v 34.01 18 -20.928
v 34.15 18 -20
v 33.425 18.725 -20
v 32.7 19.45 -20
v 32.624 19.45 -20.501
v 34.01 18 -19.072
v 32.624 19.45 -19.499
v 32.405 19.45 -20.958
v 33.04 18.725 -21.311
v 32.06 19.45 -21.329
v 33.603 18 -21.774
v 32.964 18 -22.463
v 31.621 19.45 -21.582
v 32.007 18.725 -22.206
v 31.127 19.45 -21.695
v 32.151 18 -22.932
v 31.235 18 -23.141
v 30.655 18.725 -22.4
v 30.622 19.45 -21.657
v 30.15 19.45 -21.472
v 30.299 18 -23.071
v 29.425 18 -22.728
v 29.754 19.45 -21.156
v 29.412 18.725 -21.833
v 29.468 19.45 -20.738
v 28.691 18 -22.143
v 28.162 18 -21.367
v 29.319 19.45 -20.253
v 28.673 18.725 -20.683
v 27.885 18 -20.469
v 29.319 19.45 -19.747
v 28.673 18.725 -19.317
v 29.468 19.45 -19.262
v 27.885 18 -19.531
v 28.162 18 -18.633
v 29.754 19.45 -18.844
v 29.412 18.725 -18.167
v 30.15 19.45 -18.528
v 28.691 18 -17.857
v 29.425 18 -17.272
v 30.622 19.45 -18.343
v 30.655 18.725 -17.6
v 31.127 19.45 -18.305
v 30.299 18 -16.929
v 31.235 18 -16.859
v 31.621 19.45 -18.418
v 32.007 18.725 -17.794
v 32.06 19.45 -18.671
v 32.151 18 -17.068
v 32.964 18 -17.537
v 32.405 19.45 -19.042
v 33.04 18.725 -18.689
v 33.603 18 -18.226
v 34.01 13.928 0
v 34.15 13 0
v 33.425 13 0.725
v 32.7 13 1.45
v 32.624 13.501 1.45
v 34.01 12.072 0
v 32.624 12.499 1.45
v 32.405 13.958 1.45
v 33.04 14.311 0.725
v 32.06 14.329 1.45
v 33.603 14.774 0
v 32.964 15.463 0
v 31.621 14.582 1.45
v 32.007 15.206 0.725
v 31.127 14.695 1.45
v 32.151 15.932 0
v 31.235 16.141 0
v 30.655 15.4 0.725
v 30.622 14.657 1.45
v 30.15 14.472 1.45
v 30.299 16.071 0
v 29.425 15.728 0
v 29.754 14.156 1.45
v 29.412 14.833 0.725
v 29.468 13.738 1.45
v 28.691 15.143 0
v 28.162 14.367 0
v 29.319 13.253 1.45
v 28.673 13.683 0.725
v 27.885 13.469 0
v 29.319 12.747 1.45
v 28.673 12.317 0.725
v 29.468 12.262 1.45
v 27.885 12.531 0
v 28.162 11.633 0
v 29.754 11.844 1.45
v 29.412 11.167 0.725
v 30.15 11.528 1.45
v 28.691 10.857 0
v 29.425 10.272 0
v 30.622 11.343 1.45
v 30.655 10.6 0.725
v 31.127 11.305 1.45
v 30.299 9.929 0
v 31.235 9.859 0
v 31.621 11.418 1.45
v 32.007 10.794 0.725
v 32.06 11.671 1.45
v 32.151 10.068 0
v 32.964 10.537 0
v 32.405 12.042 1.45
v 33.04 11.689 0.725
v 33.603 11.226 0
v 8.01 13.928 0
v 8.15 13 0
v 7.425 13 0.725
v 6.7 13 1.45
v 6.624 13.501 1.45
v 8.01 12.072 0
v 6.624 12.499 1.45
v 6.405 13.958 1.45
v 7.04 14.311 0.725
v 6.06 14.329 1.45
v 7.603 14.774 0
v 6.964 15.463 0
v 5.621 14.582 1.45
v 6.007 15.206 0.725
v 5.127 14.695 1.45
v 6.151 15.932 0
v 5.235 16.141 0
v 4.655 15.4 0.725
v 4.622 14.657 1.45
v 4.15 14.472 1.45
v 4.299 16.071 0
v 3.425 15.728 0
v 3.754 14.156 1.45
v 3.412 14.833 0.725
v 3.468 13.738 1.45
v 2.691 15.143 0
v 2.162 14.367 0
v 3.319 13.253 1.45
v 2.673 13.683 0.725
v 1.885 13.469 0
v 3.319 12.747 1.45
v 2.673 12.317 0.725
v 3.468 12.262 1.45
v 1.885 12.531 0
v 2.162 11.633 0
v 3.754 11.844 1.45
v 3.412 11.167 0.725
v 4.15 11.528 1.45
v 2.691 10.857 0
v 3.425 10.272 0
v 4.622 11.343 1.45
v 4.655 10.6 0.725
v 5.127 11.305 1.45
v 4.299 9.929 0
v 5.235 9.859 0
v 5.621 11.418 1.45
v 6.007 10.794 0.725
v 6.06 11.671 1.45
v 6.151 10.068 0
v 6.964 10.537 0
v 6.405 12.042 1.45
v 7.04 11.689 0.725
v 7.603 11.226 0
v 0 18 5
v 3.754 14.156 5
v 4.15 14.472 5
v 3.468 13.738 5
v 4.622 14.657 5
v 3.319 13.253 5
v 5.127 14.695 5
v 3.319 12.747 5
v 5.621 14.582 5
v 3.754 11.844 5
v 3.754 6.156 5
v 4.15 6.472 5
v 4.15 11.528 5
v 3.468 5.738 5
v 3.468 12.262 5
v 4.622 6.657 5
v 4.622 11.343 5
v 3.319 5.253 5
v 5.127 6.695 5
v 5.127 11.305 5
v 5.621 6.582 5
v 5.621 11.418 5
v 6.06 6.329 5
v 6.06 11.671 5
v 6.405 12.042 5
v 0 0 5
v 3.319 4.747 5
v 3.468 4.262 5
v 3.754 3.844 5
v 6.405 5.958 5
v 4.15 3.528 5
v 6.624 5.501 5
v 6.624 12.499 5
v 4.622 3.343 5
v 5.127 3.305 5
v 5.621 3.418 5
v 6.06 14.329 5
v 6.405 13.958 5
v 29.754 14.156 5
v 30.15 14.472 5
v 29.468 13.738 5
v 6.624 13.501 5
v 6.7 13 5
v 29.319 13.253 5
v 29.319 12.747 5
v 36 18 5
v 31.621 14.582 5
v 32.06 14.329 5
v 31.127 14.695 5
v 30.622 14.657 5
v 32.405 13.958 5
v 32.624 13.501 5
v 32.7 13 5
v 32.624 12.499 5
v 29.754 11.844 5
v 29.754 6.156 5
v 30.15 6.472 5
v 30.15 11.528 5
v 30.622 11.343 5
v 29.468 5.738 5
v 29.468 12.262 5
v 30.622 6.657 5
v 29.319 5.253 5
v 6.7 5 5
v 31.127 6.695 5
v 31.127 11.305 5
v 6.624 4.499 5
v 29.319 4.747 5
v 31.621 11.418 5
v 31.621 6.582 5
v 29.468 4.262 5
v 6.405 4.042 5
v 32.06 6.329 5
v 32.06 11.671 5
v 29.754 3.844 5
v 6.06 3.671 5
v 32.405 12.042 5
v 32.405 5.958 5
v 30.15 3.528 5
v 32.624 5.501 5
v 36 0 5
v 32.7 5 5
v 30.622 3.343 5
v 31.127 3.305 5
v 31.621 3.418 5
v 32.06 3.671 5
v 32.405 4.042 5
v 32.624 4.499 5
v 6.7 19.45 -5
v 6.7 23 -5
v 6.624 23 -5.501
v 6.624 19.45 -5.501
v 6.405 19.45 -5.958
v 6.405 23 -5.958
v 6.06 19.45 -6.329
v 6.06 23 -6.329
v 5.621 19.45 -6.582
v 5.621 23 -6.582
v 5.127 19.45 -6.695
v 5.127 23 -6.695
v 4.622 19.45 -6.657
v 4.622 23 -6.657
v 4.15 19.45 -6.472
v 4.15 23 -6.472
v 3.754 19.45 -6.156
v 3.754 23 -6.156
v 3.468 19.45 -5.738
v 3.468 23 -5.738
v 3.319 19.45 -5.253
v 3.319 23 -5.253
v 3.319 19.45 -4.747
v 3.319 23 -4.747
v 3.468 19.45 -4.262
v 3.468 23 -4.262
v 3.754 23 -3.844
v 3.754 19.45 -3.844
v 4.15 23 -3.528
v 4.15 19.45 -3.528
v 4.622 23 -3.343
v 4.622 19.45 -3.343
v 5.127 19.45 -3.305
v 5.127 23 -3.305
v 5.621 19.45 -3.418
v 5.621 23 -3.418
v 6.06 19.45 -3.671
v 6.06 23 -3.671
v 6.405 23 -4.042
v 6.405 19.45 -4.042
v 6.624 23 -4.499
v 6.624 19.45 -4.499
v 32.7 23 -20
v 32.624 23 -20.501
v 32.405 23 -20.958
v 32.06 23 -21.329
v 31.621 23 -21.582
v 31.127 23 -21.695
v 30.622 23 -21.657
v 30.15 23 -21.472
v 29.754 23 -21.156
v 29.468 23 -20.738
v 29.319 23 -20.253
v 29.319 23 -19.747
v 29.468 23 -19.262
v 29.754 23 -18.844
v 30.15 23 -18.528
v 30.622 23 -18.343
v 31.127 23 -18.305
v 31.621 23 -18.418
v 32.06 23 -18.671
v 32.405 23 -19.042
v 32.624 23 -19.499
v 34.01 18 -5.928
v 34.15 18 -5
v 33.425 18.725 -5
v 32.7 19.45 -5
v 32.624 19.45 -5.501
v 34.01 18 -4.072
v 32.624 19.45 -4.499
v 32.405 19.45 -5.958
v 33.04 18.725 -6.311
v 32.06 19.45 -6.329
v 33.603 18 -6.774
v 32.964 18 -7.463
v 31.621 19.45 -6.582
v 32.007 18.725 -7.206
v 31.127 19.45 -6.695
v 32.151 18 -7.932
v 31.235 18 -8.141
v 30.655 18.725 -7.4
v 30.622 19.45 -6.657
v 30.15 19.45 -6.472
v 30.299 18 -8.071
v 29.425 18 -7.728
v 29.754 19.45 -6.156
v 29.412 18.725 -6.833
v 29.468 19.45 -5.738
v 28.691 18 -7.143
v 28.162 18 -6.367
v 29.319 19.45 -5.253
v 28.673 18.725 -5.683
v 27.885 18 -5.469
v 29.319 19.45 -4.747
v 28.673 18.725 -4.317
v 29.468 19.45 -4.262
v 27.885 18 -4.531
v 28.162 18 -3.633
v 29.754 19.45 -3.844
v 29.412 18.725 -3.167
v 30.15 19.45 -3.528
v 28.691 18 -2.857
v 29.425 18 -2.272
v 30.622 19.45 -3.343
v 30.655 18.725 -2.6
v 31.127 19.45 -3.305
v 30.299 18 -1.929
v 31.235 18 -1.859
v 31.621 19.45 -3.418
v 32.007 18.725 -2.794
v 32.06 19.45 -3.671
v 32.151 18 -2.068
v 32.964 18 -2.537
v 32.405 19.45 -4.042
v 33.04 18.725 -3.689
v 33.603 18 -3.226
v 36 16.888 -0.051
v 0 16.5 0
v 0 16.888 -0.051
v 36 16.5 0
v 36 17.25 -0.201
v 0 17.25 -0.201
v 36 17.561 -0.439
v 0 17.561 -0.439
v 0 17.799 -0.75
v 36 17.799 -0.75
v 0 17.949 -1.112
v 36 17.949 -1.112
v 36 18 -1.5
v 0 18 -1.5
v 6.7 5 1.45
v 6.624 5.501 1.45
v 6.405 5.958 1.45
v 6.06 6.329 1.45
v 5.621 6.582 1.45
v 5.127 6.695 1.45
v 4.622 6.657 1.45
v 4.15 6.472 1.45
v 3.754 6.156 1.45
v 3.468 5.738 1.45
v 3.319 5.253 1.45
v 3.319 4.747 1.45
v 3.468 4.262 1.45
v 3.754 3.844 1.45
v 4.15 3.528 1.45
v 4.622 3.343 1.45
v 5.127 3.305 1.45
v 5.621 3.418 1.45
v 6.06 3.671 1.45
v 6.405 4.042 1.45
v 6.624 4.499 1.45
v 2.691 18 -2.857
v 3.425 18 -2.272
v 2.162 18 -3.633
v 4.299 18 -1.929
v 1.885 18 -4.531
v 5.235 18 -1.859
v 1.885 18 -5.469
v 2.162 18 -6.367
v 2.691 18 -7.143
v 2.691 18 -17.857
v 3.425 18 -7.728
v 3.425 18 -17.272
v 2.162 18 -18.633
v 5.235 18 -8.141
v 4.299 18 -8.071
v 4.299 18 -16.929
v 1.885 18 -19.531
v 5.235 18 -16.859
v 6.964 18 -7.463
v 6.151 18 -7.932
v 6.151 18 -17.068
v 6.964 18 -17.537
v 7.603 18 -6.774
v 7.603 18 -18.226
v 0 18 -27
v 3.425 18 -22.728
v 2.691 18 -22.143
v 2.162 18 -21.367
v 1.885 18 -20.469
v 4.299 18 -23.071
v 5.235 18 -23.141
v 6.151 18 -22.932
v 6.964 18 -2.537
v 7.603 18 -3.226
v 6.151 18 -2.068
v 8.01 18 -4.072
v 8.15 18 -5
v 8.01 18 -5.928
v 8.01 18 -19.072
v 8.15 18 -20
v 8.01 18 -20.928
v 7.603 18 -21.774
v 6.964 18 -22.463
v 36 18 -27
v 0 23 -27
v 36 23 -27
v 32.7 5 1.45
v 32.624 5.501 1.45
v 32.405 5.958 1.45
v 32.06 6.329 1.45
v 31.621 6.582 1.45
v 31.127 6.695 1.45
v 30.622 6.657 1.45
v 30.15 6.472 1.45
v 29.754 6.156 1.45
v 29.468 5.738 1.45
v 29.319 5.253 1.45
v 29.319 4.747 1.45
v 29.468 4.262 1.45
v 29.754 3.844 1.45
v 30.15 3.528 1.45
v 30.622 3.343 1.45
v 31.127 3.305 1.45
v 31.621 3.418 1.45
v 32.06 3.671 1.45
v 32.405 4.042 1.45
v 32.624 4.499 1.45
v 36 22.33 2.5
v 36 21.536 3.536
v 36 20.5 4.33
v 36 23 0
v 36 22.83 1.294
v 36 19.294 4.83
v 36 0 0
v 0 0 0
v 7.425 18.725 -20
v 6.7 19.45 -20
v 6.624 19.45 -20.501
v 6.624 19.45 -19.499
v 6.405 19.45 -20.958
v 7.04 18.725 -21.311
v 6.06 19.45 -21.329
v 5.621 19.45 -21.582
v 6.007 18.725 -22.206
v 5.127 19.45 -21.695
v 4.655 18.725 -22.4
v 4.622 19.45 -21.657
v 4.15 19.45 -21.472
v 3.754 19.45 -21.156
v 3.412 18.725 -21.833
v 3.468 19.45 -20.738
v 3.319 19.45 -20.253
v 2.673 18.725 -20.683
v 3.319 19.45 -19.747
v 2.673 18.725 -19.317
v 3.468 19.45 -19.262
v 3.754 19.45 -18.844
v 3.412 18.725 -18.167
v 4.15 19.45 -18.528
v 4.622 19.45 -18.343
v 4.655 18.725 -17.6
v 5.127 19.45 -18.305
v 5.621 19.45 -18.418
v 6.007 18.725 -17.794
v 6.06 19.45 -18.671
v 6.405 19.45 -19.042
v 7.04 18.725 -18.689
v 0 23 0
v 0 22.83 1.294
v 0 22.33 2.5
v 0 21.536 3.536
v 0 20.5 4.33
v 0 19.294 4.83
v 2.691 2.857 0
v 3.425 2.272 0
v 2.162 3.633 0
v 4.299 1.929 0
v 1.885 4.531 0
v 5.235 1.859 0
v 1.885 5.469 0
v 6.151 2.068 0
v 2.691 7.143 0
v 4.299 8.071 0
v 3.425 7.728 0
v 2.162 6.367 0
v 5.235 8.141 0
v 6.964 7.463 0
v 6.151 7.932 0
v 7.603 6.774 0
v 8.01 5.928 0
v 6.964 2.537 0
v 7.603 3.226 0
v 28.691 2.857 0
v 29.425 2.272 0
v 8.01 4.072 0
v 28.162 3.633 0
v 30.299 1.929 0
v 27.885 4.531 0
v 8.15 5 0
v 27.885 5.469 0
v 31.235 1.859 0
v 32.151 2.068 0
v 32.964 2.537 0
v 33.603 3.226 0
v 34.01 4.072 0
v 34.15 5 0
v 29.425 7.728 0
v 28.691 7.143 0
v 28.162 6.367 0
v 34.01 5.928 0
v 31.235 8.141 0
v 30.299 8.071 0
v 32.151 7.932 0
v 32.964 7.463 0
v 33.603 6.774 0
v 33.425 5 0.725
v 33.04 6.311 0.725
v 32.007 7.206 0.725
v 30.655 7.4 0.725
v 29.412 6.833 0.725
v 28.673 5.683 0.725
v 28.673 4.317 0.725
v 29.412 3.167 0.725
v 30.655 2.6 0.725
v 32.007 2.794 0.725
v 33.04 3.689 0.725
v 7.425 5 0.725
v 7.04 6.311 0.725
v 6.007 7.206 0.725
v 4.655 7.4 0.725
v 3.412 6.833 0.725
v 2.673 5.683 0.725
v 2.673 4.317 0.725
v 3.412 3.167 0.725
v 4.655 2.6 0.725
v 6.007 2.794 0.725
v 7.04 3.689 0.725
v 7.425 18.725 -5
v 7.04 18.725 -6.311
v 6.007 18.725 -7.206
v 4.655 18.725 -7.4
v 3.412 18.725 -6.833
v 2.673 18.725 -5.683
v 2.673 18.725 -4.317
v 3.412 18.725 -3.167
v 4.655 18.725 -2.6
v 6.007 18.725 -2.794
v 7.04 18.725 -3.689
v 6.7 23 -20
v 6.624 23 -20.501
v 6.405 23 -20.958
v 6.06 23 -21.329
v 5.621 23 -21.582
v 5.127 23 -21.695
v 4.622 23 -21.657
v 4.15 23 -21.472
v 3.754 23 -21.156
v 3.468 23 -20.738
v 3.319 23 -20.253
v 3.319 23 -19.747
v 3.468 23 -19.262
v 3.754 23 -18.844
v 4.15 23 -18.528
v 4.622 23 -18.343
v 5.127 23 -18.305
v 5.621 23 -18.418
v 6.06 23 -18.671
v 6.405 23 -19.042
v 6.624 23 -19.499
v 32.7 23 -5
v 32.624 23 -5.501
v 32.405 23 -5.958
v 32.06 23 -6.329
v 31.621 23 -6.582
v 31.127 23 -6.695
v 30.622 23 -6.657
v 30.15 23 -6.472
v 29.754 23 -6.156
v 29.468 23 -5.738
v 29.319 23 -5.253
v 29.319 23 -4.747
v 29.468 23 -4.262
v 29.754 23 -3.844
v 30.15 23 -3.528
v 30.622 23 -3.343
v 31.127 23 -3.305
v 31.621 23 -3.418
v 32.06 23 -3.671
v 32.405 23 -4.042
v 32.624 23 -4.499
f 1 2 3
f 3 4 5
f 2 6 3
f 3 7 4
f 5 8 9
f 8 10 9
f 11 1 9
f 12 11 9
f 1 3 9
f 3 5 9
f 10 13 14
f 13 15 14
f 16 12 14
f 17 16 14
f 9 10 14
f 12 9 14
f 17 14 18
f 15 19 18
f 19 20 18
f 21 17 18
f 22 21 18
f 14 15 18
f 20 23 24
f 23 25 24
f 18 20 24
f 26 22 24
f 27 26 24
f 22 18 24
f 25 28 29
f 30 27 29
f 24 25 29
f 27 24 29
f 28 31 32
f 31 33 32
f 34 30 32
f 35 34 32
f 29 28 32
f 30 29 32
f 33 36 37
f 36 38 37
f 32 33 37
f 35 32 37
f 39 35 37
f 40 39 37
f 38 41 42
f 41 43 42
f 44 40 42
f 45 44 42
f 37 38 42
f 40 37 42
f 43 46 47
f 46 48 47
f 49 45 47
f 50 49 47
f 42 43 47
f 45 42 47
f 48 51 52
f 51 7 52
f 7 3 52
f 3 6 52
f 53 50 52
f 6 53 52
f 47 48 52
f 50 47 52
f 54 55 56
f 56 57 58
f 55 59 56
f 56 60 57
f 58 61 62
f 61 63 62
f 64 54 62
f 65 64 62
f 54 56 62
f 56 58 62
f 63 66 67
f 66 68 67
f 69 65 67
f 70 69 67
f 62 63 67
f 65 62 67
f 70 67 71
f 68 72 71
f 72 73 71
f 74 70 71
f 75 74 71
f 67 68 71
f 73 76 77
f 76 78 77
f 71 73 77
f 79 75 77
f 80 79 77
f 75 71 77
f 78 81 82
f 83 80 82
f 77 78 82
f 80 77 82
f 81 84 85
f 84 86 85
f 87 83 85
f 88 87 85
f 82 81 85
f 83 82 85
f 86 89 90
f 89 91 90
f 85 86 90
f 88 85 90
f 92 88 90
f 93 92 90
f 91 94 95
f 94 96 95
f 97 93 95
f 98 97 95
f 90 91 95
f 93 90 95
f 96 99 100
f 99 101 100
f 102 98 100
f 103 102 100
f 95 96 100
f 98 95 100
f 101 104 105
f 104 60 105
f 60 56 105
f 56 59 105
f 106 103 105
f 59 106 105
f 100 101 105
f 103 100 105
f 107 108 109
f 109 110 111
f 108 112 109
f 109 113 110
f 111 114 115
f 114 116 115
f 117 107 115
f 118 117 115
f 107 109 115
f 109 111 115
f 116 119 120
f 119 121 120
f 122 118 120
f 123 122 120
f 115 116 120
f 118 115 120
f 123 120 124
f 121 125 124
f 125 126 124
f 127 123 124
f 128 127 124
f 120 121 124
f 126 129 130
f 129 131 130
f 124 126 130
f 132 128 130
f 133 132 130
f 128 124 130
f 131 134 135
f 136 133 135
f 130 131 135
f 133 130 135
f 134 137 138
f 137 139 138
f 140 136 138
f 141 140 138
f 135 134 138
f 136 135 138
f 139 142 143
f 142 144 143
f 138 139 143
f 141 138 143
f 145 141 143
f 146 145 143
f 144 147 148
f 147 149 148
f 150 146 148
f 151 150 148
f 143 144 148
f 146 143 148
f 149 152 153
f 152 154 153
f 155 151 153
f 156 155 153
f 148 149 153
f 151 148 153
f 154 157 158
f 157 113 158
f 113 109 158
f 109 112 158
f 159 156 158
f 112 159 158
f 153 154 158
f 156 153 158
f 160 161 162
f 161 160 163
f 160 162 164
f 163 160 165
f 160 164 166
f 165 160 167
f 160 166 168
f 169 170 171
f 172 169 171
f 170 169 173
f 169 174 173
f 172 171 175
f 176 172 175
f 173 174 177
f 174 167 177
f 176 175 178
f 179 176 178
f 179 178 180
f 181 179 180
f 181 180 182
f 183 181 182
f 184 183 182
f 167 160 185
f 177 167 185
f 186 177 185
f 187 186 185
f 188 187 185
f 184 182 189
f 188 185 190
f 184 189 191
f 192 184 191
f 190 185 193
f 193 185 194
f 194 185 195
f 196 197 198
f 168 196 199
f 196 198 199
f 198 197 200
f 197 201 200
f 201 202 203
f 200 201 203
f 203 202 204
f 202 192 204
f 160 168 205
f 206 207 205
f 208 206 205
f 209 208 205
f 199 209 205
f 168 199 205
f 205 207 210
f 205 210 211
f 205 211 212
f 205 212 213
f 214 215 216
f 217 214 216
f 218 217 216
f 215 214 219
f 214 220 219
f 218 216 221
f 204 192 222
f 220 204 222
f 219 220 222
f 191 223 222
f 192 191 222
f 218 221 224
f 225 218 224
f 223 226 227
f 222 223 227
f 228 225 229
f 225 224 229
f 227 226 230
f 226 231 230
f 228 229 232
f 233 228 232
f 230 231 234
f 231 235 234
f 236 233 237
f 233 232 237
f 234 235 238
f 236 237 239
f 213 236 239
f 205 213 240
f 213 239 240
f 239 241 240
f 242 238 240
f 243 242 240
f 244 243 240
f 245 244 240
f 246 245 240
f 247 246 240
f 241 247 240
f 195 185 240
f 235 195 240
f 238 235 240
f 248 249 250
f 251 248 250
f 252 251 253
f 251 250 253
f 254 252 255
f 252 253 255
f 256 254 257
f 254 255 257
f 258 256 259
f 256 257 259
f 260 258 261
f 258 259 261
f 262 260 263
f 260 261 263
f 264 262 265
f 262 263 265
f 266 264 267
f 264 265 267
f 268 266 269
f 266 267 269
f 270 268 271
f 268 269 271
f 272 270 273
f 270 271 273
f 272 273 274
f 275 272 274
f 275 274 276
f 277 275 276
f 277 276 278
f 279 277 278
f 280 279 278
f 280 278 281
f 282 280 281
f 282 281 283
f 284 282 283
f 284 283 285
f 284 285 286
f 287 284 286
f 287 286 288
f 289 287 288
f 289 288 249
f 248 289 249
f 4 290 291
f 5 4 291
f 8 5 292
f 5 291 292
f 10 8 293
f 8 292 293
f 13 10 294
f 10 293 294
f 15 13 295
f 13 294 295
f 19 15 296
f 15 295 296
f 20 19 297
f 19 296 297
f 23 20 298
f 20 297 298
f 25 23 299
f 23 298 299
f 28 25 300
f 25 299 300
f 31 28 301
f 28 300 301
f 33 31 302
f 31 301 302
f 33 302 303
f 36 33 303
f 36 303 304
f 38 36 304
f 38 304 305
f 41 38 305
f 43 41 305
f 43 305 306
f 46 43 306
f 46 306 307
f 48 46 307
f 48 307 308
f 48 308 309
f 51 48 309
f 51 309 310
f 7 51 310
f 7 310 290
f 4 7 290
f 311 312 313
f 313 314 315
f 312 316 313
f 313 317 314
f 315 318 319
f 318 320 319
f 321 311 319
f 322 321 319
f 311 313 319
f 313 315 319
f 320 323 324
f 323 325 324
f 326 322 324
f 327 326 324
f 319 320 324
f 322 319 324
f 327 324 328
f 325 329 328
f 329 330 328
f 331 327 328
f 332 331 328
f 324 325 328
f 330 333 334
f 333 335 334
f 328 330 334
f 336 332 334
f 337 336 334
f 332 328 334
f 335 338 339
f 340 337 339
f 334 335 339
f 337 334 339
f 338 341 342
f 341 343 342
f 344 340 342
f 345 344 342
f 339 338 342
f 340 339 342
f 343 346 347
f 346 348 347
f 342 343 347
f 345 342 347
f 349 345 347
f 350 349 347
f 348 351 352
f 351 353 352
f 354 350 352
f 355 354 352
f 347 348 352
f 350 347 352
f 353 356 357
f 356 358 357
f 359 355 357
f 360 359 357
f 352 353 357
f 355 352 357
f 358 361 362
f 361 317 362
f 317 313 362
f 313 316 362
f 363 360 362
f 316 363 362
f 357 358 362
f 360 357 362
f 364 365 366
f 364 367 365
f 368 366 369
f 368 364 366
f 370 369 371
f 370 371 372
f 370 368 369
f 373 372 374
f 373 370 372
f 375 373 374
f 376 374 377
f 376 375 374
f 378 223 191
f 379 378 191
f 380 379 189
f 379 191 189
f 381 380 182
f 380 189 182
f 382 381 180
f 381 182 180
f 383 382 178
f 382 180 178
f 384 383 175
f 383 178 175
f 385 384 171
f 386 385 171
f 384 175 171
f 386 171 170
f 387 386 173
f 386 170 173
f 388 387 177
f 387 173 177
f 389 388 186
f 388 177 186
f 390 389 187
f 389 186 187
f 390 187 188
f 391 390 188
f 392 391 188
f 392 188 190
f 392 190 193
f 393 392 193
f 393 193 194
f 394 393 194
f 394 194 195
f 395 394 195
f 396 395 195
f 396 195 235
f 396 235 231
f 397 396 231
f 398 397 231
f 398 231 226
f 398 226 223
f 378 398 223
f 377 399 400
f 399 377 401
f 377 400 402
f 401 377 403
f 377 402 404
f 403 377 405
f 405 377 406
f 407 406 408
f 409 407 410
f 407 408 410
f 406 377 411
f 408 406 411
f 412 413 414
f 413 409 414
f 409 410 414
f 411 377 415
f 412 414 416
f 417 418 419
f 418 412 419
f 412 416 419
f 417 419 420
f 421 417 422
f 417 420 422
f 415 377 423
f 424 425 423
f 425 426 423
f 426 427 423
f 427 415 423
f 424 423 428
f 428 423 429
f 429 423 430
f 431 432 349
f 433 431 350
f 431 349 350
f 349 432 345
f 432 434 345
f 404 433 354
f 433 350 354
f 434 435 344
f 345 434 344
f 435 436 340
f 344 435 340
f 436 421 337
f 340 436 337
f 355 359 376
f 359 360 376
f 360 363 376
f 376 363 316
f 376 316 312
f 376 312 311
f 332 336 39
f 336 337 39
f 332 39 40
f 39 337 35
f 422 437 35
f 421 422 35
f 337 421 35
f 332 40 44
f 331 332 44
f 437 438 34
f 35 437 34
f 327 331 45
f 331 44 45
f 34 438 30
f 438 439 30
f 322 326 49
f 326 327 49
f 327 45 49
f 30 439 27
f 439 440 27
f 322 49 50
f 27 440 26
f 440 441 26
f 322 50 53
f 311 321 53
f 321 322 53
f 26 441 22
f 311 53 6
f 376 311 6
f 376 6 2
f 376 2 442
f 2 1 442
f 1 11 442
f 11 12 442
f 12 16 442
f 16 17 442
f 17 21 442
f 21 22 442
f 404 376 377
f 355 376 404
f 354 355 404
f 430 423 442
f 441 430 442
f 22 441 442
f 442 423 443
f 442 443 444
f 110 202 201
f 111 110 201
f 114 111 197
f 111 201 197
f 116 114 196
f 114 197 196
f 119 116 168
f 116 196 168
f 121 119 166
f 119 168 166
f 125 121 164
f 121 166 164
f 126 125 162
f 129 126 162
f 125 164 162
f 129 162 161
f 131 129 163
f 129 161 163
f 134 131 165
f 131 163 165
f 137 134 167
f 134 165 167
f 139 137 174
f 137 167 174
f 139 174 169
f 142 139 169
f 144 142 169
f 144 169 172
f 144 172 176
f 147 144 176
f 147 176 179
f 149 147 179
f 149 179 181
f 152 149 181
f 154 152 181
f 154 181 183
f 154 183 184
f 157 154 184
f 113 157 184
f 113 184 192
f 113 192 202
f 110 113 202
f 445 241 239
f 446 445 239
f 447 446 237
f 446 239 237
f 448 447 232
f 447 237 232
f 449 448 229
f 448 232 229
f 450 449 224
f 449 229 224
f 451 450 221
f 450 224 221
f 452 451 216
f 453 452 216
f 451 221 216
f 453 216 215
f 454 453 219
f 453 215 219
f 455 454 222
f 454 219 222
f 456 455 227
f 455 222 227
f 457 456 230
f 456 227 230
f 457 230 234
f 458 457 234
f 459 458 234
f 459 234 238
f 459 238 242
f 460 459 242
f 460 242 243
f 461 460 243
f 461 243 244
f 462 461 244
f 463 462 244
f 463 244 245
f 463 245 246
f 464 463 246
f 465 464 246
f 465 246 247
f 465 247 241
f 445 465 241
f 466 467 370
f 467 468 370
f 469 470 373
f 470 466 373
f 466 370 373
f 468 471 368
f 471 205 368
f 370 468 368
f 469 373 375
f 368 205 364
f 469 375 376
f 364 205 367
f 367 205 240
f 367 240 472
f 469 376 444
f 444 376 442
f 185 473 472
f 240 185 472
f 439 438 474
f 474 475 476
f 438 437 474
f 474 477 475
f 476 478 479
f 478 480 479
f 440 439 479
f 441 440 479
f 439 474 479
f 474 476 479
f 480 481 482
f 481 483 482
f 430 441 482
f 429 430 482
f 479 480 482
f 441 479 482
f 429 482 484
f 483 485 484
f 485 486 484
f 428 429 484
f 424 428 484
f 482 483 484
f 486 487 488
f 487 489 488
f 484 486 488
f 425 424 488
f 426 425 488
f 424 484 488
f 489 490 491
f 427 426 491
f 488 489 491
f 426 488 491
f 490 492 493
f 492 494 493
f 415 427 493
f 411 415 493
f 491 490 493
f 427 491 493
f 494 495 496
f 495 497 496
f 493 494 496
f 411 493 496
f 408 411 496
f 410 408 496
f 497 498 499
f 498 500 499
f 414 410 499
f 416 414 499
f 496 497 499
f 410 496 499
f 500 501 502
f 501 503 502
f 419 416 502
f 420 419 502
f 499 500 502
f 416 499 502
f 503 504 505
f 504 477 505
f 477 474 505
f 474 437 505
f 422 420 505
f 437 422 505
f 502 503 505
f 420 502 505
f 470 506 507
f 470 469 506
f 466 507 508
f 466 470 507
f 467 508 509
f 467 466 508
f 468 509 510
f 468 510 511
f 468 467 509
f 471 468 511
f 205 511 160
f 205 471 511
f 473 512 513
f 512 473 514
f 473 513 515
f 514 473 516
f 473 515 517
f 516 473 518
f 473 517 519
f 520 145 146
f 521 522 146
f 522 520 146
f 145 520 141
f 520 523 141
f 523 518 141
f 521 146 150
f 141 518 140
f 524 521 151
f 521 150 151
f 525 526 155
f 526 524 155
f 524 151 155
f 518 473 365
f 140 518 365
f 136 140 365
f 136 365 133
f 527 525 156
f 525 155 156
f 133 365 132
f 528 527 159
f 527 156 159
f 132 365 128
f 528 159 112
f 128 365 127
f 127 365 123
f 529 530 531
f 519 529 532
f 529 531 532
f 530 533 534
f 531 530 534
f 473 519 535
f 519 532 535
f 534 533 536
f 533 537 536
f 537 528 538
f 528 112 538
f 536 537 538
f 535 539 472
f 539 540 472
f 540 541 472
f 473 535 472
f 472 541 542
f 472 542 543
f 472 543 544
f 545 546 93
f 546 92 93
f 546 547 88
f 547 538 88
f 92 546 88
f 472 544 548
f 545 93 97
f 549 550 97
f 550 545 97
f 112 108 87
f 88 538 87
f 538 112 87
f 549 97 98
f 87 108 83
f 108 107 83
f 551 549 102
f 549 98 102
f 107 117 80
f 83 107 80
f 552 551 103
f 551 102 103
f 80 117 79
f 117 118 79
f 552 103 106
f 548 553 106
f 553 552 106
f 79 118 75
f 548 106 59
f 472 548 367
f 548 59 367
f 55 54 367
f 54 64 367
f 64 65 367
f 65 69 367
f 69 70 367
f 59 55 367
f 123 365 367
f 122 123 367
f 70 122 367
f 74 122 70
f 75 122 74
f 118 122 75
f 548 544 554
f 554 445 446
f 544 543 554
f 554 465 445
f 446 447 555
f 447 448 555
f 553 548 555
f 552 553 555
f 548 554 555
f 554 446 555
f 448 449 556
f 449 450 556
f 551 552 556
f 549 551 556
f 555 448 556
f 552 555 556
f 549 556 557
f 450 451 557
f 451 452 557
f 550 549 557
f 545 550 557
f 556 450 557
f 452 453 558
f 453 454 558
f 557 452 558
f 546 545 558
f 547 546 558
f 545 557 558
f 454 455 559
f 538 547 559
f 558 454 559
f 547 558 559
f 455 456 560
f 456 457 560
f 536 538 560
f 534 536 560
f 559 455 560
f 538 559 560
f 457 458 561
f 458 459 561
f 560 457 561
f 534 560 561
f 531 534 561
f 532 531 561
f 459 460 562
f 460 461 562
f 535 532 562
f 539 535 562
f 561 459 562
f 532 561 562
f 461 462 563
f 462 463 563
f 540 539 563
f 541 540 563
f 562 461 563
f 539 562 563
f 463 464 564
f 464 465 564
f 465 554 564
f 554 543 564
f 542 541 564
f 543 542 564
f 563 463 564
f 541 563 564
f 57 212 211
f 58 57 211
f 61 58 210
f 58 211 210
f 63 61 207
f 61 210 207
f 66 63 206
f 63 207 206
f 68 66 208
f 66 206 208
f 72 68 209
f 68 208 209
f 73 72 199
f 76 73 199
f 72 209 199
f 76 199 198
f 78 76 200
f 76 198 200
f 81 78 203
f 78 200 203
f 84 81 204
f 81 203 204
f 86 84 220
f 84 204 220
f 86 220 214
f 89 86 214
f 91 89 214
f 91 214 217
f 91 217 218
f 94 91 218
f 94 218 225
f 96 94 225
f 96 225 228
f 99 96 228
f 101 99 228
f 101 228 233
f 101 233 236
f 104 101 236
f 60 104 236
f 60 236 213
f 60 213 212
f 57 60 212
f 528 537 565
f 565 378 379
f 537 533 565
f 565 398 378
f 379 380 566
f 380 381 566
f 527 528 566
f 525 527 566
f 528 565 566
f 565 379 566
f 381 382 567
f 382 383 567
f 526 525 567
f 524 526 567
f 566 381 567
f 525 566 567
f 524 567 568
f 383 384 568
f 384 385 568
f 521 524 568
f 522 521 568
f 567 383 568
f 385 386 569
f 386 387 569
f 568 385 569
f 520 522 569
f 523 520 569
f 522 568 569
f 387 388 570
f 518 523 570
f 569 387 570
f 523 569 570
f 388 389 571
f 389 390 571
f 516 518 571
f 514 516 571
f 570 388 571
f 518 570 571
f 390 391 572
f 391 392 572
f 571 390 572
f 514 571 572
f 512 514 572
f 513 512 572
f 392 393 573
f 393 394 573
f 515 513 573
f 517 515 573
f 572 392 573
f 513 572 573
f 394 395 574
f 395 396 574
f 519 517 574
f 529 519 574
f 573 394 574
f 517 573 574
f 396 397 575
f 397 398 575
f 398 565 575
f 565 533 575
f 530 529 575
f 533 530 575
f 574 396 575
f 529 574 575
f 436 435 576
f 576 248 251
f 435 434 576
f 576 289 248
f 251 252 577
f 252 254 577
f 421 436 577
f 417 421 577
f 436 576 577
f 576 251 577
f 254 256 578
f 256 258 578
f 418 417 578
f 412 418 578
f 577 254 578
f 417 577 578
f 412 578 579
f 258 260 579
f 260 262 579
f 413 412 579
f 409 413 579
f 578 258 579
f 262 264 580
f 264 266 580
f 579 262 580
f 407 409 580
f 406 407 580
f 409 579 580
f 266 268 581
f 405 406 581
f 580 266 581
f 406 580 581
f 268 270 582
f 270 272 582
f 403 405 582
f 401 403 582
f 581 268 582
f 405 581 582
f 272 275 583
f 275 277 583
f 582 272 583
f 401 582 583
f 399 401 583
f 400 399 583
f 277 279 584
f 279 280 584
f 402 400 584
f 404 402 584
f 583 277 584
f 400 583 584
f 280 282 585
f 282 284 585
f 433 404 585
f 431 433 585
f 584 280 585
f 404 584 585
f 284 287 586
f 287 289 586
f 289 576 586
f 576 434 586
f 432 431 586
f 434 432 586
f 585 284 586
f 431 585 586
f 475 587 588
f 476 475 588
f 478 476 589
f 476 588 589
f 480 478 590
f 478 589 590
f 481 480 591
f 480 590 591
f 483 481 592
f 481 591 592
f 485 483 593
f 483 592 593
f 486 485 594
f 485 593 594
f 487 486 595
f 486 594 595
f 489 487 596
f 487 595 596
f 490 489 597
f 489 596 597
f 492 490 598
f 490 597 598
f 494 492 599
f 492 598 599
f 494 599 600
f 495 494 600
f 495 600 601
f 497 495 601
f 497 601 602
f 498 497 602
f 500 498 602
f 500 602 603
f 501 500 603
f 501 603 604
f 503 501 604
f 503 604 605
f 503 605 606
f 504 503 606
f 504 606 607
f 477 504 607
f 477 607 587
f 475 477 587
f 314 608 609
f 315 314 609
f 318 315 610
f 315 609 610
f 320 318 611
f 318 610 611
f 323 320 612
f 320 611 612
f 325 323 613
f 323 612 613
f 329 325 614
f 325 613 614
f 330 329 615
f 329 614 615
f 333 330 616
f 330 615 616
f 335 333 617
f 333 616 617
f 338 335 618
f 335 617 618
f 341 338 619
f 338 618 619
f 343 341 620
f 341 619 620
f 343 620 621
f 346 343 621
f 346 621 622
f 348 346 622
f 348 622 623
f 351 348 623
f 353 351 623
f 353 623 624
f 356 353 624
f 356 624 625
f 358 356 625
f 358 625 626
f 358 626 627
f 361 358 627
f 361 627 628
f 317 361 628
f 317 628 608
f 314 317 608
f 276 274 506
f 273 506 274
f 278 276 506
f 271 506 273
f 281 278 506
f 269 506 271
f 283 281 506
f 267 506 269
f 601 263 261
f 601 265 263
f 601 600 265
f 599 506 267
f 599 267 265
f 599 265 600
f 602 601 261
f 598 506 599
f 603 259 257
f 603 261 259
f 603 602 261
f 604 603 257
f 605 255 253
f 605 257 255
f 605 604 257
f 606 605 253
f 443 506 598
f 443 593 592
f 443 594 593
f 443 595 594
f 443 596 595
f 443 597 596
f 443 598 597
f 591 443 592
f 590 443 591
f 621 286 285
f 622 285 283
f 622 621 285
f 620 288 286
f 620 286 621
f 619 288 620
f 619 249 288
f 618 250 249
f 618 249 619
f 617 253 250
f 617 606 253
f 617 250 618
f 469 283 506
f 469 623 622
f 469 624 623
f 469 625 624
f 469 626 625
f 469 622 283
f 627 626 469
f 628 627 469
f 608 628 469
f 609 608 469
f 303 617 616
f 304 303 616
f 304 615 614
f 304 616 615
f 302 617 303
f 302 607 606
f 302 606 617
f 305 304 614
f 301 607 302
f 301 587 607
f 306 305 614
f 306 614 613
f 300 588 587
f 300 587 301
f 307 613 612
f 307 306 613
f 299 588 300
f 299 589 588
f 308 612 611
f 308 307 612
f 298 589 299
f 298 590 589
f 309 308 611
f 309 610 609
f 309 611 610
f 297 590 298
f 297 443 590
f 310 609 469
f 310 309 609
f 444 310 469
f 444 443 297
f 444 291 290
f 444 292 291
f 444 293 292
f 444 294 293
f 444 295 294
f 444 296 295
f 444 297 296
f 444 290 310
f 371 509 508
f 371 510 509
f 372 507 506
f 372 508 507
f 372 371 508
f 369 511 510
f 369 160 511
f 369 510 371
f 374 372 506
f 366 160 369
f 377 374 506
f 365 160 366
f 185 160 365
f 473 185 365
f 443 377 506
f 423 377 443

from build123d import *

# Parameters (mm, degrees)
SKETCH1_W                                       = 36
SKETCH1_H                                       = 18
BOSS_EXTRUDE1_DEPTH                             = 5
CSK_FOR_M3_FLAT_HEAD_MACHINE_SCREW1_D           = 3.4
CSK_FOR_M3_FLAT_HEAD_MACHINE_SCREW1_DEPTH       = 5
CSK_FOR_M3_FLAT_HEAD_MACHINE_SCREW1_CSINK_D     = 6.3
CSK_FOR_M3_FLAT_HEAD_MACHINE_SCREW1_CSINK_ANGLE = 90
SKETCH7_W                                       = 36
SKETCH7_H                                       = 32
BOSS_EXTRUDE2_DEPTH                             = 5
CSK_FOR_M3_FLAT_HEAD_MACHINE_SCREW2_D           = 3.4
CSK_FOR_M3_FLAT_HEAD_MACHINE_SCREW2_DEPTH       = 5
CSK_FOR_M3_FLAT_HEAD_MACHINE_SCREW2_CSINK_D     = 6.3
CSK_FOR_M3_FLAT_HEAD_MACHINE_SCREW2_CSINK_ANGLE = 90
FILLET1_R                                       = 1.5
FILLET2_R                                       = 5


with BuildPart() as part:
    # Sketch1 → Boss-Extrude1 (new body)
    with BuildSketch(Plane.XY):
        with Locations((18, 9)):
            Rectangle(SKETCH1_W, SKETCH1_H)
    extrude(amount=BOSS_EXTRUDE1_DEPTH)

    # CSK for M3 Flat Head Machine Screw1
    with Locations(Plane(origin=(0, 0, 0), x_dir=(-1, 0, 0), z_dir=(0, 0, -1))):
        with Locations((-31, 13), (-31, 5), (-5, 5), (-5, 13)):
            CounterSinkHole(CSK_FOR_M3_FLAT_HEAD_MACHINE_SCREW1_D / 2, CSK_FOR_M3_FLAT_HEAD_MACHINE_SCREW1_CSINK_D / 2, depth=CSK_FOR_M3_FLAT_HEAD_MACHINE_SCREW1_DEPTH, counter_sink_angle=CSK_FOR_M3_FLAT_HEAD_MACHINE_SCREW1_CSINK_ANGLE)

    # Sketch7 → Boss-Extrude2 (add)
    with BuildSketch(Plane(origin=(0, 18, 0), x_dir=(1, 0, 0), z_dir=(0, 1, 0))):
        with Locations((18, 11)):
            Rectangle(SKETCH7_W, SKETCH7_H)
    extrude(amount=BOSS_EXTRUDE2_DEPTH)

    # CSK for M3 Flat Head Machine Screw2
    with Locations(Plane(origin=(0, 18, 0), x_dir=(-1, 0, 0), z_dir=(0, -1, 0))):
        with Locations((-31, 5), (-31, 20), (-5, 20), (-5, 5)):
            CounterSinkHole(CSK_FOR_M3_FLAT_HEAD_MACHINE_SCREW2_D / 2, CSK_FOR_M3_FLAT_HEAD_MACHINE_SCREW2_CSINK_D / 2, depth=CSK_FOR_M3_FLAT_HEAD_MACHINE_SCREW2_DEPTH, counter_sink_angle=CSK_FOR_M3_FLAT_HEAD_MACHINE_SCREW2_CSINK_ANGLE)

    # Fillet1
    fillet1_edges = [part.edges().sort_by_distance(p)[0] for p in [
        (18, 18, 0),
    ]]
    fillet(fillet1_edges, radius=FILLET1_R)

    # Fillet2
    fillet2_edges = [part.edges().sort_by_distance(p)[0] for p in [
        (18, 23, 5),
    ]]
    fillet(fillet2_edges, radius=FILLET2_R)


solid = part.part
